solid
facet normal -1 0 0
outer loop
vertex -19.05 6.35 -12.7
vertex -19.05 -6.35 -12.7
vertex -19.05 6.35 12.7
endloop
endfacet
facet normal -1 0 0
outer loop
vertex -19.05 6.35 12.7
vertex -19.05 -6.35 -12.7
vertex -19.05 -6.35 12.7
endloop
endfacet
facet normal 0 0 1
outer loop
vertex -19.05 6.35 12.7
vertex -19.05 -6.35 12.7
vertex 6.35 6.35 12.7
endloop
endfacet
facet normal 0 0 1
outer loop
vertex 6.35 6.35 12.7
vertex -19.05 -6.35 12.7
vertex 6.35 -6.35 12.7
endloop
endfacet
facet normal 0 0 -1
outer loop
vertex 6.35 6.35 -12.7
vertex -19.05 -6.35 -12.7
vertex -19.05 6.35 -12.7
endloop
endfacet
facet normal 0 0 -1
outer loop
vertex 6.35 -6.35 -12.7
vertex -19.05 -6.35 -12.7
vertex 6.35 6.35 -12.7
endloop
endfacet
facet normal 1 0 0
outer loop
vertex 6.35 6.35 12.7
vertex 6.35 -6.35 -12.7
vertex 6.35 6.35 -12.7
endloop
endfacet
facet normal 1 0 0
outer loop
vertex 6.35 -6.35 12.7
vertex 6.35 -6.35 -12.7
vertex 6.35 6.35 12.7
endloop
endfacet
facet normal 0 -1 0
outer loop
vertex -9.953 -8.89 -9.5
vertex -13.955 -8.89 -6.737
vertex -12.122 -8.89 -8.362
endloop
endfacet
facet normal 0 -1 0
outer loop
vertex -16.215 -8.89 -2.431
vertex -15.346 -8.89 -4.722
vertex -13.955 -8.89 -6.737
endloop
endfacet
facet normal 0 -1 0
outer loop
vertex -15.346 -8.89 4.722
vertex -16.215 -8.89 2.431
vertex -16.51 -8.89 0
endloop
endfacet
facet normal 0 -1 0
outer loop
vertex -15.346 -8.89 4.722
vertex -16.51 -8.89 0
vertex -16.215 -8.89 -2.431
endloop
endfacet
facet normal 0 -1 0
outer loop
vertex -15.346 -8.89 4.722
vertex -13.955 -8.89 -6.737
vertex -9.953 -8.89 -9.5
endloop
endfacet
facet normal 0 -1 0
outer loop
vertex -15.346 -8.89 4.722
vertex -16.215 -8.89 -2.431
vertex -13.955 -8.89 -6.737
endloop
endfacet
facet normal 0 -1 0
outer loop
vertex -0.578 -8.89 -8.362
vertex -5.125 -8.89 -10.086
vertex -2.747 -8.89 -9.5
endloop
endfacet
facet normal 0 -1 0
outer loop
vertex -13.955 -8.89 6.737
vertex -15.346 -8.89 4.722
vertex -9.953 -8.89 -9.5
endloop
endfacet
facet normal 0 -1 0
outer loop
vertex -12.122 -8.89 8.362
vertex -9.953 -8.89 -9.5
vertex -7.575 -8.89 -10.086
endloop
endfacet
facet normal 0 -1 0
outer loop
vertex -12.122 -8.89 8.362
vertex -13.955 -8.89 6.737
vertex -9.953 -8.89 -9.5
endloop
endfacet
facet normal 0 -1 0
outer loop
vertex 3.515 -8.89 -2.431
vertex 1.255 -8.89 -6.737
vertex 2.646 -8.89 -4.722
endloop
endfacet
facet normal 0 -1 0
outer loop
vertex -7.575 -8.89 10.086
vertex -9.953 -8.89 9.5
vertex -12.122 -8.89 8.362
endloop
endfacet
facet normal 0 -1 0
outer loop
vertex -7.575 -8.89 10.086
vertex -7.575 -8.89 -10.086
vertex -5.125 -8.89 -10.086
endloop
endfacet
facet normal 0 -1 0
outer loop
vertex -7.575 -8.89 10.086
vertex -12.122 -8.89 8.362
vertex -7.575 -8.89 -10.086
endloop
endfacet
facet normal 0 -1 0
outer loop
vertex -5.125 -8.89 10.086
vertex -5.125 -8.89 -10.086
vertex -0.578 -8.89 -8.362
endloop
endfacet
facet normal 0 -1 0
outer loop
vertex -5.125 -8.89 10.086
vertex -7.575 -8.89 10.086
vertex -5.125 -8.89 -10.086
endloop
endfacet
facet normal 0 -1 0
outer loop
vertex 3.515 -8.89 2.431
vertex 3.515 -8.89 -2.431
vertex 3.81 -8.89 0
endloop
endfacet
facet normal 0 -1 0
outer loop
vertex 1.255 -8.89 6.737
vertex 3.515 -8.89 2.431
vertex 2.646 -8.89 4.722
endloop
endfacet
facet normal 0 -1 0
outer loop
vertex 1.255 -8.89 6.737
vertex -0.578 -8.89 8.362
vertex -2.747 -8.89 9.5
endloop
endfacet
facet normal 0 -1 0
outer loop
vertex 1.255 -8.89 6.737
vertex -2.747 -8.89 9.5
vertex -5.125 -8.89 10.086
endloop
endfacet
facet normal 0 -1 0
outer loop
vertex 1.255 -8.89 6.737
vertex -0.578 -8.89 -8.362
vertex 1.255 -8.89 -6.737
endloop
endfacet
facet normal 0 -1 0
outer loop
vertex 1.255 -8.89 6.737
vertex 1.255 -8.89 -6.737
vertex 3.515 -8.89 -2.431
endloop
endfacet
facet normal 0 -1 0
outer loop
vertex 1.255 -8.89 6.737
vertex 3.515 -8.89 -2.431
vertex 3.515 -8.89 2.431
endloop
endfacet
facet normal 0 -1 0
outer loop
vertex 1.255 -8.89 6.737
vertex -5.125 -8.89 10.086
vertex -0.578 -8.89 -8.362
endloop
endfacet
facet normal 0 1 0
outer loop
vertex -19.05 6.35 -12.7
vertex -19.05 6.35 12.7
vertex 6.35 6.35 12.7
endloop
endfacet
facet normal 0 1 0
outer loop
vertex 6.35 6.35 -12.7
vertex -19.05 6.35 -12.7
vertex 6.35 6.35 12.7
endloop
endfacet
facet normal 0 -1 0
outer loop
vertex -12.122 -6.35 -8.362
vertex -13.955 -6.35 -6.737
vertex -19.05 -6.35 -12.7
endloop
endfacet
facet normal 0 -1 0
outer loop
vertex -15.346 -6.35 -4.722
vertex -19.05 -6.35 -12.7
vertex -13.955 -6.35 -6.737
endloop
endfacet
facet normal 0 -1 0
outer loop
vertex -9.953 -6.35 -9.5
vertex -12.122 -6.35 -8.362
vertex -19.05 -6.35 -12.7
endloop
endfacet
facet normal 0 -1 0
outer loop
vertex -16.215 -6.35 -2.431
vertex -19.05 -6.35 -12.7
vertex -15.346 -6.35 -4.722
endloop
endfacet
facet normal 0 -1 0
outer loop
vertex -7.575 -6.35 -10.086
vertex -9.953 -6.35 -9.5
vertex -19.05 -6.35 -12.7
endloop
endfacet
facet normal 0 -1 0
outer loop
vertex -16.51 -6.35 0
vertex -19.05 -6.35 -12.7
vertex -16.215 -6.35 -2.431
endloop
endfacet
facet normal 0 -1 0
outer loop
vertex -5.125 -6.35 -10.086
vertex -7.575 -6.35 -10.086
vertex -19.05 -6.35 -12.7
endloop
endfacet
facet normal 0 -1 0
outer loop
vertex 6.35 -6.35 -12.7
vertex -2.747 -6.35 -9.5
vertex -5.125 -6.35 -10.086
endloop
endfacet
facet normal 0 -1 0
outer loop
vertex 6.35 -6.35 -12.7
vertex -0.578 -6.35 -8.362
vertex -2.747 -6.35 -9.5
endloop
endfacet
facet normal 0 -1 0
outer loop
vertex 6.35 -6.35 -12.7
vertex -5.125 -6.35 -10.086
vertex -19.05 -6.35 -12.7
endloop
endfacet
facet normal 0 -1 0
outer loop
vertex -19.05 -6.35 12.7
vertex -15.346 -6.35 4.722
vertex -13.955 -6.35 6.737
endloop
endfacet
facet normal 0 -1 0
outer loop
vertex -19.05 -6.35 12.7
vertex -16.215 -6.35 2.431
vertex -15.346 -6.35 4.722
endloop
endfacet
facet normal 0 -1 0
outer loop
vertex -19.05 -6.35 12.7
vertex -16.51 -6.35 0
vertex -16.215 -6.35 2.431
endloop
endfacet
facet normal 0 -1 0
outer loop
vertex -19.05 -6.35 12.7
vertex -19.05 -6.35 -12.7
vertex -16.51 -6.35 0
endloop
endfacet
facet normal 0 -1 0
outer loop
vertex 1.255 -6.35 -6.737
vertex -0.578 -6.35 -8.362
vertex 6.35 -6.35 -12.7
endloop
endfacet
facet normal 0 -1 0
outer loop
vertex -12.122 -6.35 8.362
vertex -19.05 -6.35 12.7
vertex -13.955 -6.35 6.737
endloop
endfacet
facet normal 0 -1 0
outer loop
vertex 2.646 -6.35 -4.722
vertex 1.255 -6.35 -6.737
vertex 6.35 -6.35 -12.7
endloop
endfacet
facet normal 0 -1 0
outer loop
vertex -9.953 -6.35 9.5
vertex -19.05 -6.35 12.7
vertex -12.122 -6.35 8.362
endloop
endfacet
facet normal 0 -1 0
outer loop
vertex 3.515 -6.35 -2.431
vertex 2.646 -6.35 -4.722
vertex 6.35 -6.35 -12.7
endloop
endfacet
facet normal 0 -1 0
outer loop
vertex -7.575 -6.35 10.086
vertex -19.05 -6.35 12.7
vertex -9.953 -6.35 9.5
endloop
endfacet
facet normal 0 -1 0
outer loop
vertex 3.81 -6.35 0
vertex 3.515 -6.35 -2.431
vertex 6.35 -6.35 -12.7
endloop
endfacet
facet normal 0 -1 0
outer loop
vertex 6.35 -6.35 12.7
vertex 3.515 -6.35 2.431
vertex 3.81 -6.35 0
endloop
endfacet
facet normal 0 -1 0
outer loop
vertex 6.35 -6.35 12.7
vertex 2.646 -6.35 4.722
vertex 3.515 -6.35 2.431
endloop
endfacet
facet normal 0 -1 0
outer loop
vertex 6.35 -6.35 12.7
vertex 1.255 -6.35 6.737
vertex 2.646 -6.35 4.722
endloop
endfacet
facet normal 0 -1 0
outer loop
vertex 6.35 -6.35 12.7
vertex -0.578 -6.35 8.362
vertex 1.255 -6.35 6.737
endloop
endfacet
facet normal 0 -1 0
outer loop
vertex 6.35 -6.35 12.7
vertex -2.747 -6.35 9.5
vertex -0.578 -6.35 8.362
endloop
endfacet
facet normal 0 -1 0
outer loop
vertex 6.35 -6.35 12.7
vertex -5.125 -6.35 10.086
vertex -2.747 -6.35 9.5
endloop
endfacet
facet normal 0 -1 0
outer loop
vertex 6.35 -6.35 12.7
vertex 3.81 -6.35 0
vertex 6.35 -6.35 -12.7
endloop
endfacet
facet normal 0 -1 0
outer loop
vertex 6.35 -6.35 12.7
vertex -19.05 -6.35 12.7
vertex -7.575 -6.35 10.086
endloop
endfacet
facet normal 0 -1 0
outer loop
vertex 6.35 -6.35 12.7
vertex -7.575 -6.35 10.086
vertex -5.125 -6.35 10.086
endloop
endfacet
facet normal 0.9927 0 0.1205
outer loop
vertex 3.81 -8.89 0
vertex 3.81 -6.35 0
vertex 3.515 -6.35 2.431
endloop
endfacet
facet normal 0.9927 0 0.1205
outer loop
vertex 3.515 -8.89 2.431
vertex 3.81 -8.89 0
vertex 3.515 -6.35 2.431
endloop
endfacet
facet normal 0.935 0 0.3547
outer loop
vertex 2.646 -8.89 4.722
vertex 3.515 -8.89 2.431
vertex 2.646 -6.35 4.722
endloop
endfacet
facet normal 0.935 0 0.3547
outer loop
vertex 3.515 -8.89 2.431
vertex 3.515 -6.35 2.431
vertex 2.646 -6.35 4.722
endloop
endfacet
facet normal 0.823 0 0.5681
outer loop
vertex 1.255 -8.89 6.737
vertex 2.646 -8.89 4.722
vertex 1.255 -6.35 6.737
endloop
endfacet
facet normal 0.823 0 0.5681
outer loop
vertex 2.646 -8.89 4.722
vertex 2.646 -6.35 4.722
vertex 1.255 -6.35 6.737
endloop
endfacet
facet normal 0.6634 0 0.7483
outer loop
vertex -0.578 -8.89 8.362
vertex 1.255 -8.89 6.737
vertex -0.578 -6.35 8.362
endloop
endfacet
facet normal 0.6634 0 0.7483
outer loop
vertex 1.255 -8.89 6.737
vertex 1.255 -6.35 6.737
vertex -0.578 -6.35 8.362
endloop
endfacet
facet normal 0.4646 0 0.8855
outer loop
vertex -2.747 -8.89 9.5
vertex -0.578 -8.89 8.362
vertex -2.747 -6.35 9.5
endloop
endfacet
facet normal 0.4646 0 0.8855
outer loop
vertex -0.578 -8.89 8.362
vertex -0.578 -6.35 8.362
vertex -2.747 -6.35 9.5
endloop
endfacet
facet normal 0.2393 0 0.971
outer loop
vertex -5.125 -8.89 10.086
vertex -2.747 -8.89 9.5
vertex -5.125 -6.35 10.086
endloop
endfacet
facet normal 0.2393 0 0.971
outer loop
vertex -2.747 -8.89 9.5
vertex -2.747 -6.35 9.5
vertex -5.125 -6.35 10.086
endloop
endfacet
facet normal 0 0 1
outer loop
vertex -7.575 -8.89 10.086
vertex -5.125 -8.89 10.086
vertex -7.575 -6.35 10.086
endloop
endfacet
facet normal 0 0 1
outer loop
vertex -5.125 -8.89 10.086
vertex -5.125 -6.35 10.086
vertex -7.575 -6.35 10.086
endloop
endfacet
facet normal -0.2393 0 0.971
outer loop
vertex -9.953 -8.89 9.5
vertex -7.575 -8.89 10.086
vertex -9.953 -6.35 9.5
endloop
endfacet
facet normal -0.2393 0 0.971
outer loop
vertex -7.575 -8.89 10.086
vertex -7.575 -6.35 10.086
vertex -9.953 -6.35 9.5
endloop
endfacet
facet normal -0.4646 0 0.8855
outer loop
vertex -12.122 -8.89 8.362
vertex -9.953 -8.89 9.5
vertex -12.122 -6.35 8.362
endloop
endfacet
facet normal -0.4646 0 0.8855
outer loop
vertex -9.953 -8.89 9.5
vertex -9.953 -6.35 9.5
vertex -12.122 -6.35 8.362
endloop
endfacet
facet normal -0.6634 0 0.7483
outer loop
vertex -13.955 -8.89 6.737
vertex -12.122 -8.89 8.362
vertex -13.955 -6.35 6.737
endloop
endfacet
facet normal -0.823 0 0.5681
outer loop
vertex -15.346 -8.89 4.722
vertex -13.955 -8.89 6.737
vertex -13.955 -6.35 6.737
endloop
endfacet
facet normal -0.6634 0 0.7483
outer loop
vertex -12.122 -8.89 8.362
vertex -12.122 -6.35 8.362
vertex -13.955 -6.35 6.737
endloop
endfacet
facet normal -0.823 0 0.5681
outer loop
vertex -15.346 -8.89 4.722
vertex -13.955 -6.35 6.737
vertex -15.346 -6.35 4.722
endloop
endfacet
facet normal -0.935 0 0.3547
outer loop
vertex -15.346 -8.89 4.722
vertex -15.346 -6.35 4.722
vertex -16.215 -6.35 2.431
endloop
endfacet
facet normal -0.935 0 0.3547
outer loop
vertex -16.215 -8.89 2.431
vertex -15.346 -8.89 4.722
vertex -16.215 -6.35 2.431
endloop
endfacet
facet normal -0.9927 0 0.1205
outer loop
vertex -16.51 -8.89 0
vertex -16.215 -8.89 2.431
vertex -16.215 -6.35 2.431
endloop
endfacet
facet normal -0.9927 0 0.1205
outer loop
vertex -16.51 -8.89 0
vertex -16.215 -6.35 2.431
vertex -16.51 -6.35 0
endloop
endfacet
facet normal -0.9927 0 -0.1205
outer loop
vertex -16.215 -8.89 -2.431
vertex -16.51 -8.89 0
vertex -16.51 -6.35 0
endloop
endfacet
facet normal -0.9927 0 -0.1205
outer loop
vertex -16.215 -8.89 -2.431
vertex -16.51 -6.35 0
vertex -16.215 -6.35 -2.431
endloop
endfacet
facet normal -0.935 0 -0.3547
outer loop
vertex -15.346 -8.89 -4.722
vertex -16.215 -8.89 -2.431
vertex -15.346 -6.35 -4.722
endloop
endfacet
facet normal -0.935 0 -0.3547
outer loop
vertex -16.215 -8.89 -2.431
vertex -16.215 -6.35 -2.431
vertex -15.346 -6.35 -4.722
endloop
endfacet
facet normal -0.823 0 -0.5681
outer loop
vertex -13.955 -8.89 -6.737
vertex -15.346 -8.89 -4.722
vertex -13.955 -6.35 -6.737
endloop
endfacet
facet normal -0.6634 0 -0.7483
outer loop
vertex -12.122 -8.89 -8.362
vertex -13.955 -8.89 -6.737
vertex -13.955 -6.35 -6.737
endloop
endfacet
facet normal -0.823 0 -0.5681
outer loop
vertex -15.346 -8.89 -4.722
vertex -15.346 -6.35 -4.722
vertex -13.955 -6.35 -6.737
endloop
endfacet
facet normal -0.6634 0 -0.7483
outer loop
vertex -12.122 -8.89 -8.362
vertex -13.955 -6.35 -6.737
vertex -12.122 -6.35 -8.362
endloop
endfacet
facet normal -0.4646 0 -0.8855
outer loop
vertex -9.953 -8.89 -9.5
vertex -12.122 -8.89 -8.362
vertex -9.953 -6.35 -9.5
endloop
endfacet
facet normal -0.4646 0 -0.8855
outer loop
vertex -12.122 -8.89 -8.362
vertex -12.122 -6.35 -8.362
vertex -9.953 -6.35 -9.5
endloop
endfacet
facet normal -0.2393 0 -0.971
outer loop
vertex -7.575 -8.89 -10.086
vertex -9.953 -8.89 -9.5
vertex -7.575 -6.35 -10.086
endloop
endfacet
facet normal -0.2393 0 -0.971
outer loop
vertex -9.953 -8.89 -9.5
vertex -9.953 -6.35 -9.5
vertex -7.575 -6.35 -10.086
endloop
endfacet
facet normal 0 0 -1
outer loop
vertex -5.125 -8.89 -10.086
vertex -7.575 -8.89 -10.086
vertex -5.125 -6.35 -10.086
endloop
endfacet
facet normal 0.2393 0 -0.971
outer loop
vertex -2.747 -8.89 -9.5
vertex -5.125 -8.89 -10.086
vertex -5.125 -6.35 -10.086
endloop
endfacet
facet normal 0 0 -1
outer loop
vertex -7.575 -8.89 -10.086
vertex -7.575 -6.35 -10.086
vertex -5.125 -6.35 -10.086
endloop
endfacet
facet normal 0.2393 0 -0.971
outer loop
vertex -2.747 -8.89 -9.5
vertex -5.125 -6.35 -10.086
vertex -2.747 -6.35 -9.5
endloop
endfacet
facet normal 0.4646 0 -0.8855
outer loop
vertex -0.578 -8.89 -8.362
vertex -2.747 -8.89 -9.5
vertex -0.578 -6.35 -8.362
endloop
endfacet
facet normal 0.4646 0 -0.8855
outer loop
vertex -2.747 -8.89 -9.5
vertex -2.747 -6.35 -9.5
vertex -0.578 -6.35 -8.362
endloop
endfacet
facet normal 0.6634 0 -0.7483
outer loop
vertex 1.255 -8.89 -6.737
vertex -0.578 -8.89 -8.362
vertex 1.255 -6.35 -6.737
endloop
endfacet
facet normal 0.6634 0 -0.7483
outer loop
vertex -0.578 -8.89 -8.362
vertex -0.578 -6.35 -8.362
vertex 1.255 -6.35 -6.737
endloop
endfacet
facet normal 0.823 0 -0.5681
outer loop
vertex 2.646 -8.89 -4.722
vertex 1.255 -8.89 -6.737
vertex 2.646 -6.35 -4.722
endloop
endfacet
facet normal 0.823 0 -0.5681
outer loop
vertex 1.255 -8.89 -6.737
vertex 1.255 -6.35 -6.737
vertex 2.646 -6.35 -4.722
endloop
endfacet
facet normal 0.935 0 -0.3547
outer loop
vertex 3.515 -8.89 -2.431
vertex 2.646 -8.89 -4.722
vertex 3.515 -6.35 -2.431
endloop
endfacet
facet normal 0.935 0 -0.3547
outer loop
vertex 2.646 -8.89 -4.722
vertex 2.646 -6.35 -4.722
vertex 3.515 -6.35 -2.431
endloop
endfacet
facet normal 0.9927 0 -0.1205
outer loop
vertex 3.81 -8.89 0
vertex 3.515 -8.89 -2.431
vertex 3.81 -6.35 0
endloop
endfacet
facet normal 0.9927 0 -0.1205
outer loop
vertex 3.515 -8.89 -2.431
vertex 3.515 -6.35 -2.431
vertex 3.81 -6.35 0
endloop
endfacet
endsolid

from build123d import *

# Parameters (mm, degrees)
F0_W     = 12.7
F0_H     = 25.4
F1_DEPTH = 6.35
F2_DEPTH = 6.35
F3_R     = 10.16
F4_DEPTH = 2.54


with BuildPart() as f1:
    # F0 (on Front) → F1 (new body, symmetric)
    with BuildSketch(Plane.XZ):
        Rectangle(F0_W, F0_H)
    extrude(amount=F1_DEPTH, both=True)

    # F0 (on Front) → F2 (join, symmetric)
    with BuildSketch(Plane.XZ):
        with Locations((-12.7, 0)):
            Rectangle(F0_W, F0_H)
    extrude(amount=F2_DEPTH, both=True)

    # F3 (on face) → F4 (join)
    with BuildSketch(Plane.XZ.offset(6.35)):
        with Locations((-6.35, 0)):
            Circle(F3_R)
    extrude(amount=F4_DEPTH)


solid = f1.part
